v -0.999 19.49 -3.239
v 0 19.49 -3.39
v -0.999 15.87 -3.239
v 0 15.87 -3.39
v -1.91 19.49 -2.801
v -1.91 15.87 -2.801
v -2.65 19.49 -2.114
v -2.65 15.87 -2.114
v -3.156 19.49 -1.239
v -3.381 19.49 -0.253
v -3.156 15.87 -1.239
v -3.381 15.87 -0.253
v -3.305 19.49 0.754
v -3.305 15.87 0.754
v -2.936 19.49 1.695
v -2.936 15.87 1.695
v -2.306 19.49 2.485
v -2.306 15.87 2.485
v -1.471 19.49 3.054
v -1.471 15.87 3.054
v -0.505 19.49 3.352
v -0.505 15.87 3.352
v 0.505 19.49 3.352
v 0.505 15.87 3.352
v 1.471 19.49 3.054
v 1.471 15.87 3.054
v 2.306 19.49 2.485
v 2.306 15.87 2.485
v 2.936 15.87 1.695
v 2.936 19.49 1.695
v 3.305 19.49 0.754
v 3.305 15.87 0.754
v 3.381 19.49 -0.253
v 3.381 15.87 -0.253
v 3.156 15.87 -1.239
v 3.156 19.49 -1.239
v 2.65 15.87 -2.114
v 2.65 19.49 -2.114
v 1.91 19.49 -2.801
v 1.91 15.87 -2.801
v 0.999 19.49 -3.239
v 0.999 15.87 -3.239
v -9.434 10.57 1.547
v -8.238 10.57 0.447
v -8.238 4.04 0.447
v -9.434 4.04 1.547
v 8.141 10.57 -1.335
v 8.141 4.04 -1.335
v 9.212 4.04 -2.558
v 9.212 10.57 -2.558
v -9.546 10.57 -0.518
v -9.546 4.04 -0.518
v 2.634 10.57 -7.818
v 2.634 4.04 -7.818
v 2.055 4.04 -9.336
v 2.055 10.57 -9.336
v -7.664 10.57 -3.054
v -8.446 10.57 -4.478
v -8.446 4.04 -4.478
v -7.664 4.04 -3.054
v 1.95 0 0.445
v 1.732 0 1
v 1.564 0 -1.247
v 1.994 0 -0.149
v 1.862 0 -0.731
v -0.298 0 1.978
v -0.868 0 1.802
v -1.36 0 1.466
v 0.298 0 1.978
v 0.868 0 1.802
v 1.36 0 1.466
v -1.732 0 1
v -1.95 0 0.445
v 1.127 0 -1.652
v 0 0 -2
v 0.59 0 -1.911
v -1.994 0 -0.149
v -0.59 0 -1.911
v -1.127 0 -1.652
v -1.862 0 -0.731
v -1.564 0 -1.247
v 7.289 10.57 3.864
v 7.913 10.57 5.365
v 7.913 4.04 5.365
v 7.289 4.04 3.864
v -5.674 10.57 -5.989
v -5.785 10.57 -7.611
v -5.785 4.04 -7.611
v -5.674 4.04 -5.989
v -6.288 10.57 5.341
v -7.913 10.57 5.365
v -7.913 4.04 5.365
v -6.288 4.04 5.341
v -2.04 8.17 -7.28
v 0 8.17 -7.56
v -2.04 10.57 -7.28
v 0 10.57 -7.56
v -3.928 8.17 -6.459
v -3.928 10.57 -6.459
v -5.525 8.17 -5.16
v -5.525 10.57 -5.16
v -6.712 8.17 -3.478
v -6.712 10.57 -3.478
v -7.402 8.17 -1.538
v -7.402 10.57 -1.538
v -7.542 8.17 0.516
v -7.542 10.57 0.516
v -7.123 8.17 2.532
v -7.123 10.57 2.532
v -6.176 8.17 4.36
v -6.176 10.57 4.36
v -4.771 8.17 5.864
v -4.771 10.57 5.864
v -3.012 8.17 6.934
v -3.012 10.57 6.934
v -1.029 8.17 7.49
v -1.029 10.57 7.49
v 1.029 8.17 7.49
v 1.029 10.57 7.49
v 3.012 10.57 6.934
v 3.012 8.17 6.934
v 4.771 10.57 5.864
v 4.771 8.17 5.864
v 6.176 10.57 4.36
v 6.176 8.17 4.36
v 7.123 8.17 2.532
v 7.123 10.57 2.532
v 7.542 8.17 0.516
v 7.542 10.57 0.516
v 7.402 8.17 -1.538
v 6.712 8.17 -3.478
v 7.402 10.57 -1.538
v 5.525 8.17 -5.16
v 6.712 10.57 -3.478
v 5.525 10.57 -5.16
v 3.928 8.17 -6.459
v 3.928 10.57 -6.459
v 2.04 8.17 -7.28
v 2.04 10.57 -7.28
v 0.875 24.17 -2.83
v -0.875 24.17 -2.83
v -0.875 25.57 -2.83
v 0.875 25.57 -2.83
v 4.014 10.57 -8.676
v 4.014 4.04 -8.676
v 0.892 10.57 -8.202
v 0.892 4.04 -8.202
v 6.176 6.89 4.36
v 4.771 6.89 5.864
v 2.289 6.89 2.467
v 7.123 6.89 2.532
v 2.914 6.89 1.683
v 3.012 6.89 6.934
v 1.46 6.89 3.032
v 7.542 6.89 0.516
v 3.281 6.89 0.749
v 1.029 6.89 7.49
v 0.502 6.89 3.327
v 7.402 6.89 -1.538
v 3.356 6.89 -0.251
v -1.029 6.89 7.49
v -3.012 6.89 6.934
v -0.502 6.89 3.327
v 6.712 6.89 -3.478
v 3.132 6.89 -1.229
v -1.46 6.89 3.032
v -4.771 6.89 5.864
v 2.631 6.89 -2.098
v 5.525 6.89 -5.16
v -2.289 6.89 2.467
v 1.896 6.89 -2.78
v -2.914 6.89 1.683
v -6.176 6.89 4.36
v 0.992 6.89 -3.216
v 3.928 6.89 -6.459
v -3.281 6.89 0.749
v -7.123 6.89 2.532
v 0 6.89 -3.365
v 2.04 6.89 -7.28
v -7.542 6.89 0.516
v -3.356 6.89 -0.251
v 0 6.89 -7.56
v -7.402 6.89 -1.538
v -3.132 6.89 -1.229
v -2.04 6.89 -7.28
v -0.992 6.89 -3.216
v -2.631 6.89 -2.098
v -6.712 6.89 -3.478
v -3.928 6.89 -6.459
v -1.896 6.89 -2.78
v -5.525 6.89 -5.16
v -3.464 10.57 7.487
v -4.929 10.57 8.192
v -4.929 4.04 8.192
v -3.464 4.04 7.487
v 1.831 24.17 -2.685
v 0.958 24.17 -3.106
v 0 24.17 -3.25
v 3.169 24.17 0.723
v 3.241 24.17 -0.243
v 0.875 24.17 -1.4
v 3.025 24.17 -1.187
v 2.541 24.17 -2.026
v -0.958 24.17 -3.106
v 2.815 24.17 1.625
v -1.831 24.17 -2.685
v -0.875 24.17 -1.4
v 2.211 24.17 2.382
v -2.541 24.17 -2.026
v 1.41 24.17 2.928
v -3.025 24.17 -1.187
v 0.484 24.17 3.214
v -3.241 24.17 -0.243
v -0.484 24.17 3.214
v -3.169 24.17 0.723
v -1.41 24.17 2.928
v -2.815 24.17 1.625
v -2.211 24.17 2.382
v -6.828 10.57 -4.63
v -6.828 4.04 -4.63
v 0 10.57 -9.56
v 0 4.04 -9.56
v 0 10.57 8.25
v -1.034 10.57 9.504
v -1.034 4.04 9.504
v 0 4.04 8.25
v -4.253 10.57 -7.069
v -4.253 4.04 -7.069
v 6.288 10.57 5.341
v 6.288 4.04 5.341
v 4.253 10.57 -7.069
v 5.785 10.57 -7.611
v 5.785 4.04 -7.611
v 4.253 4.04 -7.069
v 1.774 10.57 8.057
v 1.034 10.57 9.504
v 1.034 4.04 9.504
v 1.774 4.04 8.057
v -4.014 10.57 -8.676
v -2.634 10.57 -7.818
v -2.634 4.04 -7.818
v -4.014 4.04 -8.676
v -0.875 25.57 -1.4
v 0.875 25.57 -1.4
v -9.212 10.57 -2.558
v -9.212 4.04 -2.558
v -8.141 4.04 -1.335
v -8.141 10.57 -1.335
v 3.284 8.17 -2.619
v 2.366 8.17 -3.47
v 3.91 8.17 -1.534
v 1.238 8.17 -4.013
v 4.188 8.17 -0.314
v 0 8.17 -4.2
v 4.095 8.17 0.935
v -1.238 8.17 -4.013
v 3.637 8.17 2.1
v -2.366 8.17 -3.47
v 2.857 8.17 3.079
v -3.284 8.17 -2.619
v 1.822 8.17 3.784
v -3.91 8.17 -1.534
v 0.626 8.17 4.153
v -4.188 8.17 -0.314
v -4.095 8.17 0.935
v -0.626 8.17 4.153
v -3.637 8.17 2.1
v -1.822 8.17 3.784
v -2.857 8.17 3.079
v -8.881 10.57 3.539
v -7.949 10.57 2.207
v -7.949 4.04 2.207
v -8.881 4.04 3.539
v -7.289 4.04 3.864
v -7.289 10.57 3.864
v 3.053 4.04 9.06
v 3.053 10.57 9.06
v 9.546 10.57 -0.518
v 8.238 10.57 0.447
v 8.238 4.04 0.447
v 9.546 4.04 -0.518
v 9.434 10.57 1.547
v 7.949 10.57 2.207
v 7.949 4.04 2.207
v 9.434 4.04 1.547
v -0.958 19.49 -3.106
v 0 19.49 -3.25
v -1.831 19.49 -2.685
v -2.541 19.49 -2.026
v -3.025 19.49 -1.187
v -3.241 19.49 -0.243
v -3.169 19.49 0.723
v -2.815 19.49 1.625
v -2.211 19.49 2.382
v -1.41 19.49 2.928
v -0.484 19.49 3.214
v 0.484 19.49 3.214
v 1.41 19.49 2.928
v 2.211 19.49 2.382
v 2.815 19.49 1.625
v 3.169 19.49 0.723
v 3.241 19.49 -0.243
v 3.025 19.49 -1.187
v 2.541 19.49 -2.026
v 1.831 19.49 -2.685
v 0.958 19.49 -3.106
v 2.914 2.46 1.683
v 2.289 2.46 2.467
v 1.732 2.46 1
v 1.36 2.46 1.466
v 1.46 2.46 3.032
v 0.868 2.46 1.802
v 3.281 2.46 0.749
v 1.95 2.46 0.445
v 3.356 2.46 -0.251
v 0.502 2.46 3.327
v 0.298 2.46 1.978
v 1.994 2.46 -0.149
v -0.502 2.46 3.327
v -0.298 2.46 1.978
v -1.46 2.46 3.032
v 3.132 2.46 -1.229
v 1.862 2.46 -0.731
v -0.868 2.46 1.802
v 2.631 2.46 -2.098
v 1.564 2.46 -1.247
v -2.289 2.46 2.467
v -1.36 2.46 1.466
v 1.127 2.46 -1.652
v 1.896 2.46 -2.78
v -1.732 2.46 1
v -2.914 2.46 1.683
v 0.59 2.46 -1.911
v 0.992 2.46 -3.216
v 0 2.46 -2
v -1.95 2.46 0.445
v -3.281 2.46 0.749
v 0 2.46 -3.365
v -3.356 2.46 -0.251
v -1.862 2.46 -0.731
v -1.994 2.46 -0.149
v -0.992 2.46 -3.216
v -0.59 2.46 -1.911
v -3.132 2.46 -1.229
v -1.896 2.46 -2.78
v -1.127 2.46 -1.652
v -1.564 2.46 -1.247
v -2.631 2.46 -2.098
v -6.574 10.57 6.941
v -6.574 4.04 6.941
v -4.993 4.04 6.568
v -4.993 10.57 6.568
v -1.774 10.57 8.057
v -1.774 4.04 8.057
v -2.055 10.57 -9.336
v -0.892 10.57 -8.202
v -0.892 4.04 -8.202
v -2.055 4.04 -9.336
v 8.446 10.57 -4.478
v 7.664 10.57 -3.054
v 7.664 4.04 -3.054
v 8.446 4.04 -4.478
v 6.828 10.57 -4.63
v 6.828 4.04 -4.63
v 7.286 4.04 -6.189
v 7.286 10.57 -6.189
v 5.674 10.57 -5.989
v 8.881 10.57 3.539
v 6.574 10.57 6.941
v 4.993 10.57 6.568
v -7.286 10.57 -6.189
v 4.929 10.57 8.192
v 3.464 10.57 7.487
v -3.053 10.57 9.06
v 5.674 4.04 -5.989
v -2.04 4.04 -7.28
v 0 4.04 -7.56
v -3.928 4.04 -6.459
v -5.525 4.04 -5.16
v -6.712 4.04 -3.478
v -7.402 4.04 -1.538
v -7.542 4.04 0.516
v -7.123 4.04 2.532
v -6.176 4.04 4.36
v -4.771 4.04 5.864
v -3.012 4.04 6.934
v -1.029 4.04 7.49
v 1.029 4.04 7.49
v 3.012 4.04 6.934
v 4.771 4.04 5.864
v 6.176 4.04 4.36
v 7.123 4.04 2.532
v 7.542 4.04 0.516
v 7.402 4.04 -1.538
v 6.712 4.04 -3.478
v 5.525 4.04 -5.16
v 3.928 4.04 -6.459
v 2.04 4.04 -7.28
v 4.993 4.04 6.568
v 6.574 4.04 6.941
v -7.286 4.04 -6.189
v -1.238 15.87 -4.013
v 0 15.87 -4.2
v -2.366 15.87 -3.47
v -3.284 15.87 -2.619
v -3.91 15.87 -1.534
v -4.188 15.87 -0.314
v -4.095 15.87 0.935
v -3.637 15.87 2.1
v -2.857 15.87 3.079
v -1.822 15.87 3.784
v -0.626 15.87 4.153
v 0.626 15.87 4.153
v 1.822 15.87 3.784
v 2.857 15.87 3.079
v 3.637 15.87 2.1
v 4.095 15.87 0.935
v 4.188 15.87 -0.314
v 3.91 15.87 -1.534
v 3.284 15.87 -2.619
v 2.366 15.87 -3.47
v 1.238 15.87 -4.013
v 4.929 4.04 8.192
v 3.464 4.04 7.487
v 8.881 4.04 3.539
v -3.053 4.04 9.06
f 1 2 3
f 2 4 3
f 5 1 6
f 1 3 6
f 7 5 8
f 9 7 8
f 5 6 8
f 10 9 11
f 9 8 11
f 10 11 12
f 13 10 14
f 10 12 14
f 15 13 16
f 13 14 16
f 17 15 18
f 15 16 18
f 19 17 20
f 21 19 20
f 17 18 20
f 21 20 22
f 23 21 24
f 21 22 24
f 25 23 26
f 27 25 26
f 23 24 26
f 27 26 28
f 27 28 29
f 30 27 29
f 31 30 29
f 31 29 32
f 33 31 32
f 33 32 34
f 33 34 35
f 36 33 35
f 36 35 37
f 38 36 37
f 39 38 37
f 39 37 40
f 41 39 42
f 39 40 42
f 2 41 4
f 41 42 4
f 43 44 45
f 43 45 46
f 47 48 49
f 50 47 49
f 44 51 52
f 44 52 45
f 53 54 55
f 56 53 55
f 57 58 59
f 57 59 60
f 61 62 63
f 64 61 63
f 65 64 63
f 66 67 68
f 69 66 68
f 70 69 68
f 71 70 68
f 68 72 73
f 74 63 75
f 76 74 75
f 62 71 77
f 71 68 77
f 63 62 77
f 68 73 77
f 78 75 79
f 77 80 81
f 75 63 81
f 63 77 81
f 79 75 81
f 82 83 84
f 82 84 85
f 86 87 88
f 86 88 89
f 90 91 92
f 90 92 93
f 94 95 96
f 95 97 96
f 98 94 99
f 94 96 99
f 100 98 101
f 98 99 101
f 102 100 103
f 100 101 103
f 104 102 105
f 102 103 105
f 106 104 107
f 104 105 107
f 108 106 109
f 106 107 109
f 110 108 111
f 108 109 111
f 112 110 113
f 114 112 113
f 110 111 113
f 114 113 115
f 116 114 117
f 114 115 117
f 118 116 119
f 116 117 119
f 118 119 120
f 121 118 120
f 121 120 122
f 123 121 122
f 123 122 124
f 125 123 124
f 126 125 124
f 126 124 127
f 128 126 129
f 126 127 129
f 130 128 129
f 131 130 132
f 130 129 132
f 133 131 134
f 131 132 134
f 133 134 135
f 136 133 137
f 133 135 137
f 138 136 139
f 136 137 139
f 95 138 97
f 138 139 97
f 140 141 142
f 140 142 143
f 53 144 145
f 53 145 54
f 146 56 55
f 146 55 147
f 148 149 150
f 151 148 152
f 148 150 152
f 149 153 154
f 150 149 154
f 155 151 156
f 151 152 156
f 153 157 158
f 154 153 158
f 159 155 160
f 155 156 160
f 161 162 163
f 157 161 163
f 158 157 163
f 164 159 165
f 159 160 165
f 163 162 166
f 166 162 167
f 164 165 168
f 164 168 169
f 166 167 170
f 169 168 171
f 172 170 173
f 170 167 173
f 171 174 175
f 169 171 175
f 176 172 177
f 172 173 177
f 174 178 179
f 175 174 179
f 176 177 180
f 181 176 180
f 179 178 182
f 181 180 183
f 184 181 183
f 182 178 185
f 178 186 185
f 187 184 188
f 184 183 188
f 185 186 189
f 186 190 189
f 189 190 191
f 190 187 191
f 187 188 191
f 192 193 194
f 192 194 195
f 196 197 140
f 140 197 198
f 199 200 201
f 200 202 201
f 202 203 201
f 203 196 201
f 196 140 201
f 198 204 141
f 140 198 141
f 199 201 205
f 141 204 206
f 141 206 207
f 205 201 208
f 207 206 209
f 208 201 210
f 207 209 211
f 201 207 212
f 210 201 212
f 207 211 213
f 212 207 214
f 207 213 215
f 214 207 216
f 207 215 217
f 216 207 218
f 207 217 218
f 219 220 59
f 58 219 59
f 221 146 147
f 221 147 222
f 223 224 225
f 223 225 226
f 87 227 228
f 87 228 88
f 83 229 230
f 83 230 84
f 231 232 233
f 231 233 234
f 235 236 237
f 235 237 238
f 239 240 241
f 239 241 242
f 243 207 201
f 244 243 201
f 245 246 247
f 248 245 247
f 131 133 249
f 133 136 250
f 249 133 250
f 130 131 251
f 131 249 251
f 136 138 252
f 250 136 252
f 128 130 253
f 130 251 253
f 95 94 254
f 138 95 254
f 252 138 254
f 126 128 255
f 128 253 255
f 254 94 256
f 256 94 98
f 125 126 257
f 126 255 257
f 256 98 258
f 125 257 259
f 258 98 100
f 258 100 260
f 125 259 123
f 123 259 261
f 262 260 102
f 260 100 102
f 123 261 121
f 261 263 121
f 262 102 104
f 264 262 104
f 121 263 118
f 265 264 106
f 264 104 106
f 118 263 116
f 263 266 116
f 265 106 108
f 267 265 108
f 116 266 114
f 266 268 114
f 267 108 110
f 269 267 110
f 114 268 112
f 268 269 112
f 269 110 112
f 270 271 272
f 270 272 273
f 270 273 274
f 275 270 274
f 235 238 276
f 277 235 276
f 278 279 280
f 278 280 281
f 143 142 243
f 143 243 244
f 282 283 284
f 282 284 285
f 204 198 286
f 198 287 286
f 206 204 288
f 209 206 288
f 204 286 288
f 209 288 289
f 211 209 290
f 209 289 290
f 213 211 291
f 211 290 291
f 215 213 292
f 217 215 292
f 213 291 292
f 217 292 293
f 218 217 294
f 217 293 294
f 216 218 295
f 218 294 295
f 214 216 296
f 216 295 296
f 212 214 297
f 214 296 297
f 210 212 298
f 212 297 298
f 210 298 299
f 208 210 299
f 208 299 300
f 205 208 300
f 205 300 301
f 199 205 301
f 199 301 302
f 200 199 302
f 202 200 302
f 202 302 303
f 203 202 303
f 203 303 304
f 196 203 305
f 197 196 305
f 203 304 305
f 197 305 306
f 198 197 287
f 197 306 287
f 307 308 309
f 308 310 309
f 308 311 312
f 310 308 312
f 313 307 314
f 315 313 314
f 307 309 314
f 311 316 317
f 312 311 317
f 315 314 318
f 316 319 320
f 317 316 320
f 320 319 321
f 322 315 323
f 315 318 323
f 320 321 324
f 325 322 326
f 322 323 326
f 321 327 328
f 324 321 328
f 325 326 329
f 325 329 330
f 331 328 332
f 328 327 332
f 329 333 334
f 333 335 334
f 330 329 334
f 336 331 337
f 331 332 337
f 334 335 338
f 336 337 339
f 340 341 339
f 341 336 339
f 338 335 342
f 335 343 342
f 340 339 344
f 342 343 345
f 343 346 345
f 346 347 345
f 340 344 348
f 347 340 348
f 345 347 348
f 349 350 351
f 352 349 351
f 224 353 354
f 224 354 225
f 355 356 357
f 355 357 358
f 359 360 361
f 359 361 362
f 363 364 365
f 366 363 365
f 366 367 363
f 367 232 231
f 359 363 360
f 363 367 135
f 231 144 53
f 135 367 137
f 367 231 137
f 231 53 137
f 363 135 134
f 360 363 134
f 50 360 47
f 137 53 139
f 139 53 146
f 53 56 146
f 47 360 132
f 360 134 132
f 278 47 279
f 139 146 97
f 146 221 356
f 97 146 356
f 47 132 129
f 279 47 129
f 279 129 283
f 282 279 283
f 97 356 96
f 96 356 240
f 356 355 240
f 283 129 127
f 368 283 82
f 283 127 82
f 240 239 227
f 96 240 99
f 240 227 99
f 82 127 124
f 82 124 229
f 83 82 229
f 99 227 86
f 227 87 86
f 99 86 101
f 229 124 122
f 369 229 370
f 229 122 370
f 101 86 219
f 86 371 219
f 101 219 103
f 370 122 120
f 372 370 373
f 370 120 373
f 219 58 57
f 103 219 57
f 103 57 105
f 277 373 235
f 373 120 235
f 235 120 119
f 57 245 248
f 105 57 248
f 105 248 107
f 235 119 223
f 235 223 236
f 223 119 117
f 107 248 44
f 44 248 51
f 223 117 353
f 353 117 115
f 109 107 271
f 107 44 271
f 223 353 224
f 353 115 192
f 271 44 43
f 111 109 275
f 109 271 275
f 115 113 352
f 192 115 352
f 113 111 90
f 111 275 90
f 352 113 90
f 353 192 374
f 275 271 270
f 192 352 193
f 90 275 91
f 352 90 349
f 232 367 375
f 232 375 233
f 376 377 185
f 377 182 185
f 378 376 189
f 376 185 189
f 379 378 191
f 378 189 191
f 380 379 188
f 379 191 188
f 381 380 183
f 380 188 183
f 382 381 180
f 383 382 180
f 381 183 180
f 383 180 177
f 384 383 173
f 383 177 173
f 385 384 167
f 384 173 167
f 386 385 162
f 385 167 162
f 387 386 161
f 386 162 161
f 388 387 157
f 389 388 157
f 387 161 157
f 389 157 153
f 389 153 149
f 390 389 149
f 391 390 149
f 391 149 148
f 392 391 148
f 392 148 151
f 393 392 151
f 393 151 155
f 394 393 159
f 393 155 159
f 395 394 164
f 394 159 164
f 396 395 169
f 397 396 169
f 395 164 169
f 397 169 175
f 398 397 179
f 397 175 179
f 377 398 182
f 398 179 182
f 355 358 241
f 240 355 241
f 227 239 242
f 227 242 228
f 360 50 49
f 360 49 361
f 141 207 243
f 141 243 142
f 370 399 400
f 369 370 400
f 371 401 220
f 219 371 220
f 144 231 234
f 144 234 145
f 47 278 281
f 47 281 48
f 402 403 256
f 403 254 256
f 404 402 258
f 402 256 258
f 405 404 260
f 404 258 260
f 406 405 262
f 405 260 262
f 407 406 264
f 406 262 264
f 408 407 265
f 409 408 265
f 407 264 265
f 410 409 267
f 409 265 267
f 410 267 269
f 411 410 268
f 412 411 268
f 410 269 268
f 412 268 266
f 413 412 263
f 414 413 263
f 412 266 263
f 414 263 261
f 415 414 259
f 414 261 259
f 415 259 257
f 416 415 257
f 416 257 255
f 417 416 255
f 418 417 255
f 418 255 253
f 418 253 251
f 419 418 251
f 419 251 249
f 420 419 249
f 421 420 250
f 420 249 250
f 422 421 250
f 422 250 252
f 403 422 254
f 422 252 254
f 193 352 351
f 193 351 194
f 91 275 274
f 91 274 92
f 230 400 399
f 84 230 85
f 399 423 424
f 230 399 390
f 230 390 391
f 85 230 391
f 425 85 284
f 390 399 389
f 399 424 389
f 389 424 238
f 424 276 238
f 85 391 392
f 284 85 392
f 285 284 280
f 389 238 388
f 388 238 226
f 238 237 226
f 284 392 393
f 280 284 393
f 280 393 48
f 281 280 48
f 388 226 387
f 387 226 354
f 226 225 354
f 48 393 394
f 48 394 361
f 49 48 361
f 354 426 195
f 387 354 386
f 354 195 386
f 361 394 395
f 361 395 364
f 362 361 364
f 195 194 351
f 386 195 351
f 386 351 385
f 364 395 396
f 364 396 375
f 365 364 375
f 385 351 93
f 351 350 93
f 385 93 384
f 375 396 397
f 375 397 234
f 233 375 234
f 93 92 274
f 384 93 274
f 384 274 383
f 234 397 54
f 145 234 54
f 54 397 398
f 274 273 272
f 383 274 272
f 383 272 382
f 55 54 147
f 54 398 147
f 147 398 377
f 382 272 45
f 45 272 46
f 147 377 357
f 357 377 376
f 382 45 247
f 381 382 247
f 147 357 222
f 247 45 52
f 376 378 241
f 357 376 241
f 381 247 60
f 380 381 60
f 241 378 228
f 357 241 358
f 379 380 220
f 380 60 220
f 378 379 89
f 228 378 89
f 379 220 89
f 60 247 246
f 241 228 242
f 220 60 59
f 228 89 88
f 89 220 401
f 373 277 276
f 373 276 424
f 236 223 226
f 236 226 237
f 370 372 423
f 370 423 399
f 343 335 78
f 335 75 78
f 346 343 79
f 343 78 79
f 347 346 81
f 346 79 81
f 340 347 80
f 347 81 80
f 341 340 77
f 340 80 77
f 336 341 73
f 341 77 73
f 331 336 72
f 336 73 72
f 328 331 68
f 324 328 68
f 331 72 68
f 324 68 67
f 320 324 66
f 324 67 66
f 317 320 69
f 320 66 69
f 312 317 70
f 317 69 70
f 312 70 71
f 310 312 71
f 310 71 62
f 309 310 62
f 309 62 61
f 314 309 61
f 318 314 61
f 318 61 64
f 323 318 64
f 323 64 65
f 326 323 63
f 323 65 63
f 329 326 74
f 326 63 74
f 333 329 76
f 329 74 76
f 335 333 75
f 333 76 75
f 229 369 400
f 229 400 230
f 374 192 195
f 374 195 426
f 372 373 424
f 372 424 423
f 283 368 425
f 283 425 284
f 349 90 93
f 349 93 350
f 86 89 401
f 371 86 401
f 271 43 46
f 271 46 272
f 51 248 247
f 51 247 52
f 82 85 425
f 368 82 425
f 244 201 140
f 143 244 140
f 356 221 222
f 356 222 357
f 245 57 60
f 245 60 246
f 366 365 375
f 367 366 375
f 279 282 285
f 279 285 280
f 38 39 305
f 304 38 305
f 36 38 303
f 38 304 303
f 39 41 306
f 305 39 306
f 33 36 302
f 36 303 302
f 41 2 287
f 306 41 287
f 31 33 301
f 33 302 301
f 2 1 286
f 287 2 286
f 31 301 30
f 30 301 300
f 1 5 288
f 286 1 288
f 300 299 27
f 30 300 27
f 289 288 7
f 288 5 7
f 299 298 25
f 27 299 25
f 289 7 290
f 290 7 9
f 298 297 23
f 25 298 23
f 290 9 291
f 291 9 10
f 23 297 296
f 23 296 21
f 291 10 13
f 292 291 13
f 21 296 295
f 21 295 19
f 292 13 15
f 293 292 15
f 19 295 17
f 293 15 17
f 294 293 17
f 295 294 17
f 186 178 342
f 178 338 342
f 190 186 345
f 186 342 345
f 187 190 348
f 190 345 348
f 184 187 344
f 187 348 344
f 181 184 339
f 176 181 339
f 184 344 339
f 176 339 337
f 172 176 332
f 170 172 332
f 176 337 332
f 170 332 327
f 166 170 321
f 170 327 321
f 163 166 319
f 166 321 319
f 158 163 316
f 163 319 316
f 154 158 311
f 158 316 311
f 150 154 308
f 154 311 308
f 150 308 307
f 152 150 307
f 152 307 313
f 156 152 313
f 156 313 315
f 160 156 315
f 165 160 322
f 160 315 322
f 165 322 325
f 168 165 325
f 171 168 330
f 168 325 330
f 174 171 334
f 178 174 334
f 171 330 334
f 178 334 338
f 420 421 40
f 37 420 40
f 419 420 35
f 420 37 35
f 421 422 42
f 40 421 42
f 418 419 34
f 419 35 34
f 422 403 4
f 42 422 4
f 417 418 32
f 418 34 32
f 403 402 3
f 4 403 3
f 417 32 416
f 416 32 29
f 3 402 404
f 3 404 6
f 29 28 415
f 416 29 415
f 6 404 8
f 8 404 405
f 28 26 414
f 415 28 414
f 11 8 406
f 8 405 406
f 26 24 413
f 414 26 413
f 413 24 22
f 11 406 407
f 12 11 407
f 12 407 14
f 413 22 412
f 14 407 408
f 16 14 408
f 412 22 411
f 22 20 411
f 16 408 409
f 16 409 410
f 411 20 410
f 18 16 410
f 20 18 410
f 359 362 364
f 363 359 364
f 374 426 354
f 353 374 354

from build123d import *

# Parameters (mm, degrees)
SKETCH2_W           = 1.75
SKETCH2_H           = 1.43
BOSS_EXTRUDE1_DEPTH = 1.4
SKETCH3_R           = 10.06
CUT_EXTRUDE1_DEPTH  = 21.193741605


with BuildPart() as part:
    # Sketch1 → Revolve1 (revolve)
    with BuildSketch(Plane.XY, mode=Mode.PRIVATE) as revolve1_sk:
        Polygon((0, 0), (0, 24.17), (3.25, 24.17), (3.25, 19.49), (3.39, 19.49), (3.39, 15.87), (4.2, 15.87), (4.2, 8.17), (7.56, 8.17), (7.56, 10.57), (9.56, 10.57), (9.56, 4.04), (7.56, 4.04), (7.56, 6.89), (3.365, 6.89), (3.365, 2.46), (2, 2.46), (2, 0), align=None)
    revolve(revolve1_sk.sketch.rotate(Axis((0, 0, 0), (0, 1, 0)), 90), axis=Axis((0, 0, 0), (0, 1, 0)))

    # Sketch2 → Boss-Extrude1 (add)
    with BuildSketch(Plane(origin=(0, 24.17, 0), x_dir=(1, 0, 0), z_dir=(0, 1, 0))):
        with Locations((0, 2.115)):
            Rectangle(SKETCH2_W, SKETCH2_H)
    extrude(amount=BOSS_EXTRUDE1_DEPTH)

    # Sketch3 → Cut-Extrude1 (cut, through all)
    with BuildSketch(Plane(origin=(0, 10.57, 0), x_dir=(1, 0, 0), z_dir=(0, 1, 0))):
        Circle(SKETCH3_R)
        Polygon((0, 9.56), (-0.891981902, 8.201638147), (-2.055117408, 9.336492513), (-2.634237624, 7.818138662), (-4.014139811, 8.676421012), (-4.253319322, 7.069071703), (-5.785465497, 7.610649708), (-5.673520536, 5.989462808), (-7.286269247, 6.189012883), (-6.828434235, 4.629793289), (-8.446375145, 4.477984693), (-7.664057938, 3.053639782), (-9.211537928, 2.557570916), (-8.141318811, 1.334701472), (-9.545979436, 0.517567966), (-8.237900664, -0.446645996), (-9.434061555, -1.546635887), (-7.949287438, -2.207108793), (-8.881017441, -3.538520765), (-7.288974367, -3.864369636), (-7.912706822, -5.364948345), (-6.287836955, -5.340936849), (-6.574406827, -6.940516903), (-4.992687275, -6.567767792), (-4.928694875, -8.191554604), (-3.464085088, -7.487497212), (-3.052522628, -9.059564317), (-1.773506132, -8.057119585), (-1.033617816, -9.50395887), (0, -8.25), (1.033617816, -9.50395887), (1.773506132, -8.057119585), (3.052522628, -9.059564317), (3.464085088, -7.487497212), (4.928694875, -8.191554604), (4.992687275, -6.567767792), (6.574406827, -6.940516903), (6.287836955, -5.340936849), (7.912706822, -5.364948345), (7.288974367, -3.864369636), (8.881017441, -3.538520765), (7.949287438, -2.207108793), (9.434061555, -1.546635887), (8.237900664, -0.446645996), (9.545979436, 0.517567966), (8.141318811, 1.334701472), (9.211537928, 2.557570916), (7.664057938, 3.053639782), (8.446375145, 4.477984693), (6.828434235, 4.629793289), (7.286269247, 6.189012883), (5.673520536, 5.989462808), (5.785465497, 7.610649708), (4.253319322, 7.069071703), (4.014139811, 8.676421012), (2.634237624, 7.818138662), (2.055117408, 9.336492513), (0.891981902, 8.201638147), align=None, mode=Mode.SUBTRACT)
    extrude(amount=-CUT_EXTRUDE1_DEPTH, mode=Mode.SUBTRACT)


solid = part.part
